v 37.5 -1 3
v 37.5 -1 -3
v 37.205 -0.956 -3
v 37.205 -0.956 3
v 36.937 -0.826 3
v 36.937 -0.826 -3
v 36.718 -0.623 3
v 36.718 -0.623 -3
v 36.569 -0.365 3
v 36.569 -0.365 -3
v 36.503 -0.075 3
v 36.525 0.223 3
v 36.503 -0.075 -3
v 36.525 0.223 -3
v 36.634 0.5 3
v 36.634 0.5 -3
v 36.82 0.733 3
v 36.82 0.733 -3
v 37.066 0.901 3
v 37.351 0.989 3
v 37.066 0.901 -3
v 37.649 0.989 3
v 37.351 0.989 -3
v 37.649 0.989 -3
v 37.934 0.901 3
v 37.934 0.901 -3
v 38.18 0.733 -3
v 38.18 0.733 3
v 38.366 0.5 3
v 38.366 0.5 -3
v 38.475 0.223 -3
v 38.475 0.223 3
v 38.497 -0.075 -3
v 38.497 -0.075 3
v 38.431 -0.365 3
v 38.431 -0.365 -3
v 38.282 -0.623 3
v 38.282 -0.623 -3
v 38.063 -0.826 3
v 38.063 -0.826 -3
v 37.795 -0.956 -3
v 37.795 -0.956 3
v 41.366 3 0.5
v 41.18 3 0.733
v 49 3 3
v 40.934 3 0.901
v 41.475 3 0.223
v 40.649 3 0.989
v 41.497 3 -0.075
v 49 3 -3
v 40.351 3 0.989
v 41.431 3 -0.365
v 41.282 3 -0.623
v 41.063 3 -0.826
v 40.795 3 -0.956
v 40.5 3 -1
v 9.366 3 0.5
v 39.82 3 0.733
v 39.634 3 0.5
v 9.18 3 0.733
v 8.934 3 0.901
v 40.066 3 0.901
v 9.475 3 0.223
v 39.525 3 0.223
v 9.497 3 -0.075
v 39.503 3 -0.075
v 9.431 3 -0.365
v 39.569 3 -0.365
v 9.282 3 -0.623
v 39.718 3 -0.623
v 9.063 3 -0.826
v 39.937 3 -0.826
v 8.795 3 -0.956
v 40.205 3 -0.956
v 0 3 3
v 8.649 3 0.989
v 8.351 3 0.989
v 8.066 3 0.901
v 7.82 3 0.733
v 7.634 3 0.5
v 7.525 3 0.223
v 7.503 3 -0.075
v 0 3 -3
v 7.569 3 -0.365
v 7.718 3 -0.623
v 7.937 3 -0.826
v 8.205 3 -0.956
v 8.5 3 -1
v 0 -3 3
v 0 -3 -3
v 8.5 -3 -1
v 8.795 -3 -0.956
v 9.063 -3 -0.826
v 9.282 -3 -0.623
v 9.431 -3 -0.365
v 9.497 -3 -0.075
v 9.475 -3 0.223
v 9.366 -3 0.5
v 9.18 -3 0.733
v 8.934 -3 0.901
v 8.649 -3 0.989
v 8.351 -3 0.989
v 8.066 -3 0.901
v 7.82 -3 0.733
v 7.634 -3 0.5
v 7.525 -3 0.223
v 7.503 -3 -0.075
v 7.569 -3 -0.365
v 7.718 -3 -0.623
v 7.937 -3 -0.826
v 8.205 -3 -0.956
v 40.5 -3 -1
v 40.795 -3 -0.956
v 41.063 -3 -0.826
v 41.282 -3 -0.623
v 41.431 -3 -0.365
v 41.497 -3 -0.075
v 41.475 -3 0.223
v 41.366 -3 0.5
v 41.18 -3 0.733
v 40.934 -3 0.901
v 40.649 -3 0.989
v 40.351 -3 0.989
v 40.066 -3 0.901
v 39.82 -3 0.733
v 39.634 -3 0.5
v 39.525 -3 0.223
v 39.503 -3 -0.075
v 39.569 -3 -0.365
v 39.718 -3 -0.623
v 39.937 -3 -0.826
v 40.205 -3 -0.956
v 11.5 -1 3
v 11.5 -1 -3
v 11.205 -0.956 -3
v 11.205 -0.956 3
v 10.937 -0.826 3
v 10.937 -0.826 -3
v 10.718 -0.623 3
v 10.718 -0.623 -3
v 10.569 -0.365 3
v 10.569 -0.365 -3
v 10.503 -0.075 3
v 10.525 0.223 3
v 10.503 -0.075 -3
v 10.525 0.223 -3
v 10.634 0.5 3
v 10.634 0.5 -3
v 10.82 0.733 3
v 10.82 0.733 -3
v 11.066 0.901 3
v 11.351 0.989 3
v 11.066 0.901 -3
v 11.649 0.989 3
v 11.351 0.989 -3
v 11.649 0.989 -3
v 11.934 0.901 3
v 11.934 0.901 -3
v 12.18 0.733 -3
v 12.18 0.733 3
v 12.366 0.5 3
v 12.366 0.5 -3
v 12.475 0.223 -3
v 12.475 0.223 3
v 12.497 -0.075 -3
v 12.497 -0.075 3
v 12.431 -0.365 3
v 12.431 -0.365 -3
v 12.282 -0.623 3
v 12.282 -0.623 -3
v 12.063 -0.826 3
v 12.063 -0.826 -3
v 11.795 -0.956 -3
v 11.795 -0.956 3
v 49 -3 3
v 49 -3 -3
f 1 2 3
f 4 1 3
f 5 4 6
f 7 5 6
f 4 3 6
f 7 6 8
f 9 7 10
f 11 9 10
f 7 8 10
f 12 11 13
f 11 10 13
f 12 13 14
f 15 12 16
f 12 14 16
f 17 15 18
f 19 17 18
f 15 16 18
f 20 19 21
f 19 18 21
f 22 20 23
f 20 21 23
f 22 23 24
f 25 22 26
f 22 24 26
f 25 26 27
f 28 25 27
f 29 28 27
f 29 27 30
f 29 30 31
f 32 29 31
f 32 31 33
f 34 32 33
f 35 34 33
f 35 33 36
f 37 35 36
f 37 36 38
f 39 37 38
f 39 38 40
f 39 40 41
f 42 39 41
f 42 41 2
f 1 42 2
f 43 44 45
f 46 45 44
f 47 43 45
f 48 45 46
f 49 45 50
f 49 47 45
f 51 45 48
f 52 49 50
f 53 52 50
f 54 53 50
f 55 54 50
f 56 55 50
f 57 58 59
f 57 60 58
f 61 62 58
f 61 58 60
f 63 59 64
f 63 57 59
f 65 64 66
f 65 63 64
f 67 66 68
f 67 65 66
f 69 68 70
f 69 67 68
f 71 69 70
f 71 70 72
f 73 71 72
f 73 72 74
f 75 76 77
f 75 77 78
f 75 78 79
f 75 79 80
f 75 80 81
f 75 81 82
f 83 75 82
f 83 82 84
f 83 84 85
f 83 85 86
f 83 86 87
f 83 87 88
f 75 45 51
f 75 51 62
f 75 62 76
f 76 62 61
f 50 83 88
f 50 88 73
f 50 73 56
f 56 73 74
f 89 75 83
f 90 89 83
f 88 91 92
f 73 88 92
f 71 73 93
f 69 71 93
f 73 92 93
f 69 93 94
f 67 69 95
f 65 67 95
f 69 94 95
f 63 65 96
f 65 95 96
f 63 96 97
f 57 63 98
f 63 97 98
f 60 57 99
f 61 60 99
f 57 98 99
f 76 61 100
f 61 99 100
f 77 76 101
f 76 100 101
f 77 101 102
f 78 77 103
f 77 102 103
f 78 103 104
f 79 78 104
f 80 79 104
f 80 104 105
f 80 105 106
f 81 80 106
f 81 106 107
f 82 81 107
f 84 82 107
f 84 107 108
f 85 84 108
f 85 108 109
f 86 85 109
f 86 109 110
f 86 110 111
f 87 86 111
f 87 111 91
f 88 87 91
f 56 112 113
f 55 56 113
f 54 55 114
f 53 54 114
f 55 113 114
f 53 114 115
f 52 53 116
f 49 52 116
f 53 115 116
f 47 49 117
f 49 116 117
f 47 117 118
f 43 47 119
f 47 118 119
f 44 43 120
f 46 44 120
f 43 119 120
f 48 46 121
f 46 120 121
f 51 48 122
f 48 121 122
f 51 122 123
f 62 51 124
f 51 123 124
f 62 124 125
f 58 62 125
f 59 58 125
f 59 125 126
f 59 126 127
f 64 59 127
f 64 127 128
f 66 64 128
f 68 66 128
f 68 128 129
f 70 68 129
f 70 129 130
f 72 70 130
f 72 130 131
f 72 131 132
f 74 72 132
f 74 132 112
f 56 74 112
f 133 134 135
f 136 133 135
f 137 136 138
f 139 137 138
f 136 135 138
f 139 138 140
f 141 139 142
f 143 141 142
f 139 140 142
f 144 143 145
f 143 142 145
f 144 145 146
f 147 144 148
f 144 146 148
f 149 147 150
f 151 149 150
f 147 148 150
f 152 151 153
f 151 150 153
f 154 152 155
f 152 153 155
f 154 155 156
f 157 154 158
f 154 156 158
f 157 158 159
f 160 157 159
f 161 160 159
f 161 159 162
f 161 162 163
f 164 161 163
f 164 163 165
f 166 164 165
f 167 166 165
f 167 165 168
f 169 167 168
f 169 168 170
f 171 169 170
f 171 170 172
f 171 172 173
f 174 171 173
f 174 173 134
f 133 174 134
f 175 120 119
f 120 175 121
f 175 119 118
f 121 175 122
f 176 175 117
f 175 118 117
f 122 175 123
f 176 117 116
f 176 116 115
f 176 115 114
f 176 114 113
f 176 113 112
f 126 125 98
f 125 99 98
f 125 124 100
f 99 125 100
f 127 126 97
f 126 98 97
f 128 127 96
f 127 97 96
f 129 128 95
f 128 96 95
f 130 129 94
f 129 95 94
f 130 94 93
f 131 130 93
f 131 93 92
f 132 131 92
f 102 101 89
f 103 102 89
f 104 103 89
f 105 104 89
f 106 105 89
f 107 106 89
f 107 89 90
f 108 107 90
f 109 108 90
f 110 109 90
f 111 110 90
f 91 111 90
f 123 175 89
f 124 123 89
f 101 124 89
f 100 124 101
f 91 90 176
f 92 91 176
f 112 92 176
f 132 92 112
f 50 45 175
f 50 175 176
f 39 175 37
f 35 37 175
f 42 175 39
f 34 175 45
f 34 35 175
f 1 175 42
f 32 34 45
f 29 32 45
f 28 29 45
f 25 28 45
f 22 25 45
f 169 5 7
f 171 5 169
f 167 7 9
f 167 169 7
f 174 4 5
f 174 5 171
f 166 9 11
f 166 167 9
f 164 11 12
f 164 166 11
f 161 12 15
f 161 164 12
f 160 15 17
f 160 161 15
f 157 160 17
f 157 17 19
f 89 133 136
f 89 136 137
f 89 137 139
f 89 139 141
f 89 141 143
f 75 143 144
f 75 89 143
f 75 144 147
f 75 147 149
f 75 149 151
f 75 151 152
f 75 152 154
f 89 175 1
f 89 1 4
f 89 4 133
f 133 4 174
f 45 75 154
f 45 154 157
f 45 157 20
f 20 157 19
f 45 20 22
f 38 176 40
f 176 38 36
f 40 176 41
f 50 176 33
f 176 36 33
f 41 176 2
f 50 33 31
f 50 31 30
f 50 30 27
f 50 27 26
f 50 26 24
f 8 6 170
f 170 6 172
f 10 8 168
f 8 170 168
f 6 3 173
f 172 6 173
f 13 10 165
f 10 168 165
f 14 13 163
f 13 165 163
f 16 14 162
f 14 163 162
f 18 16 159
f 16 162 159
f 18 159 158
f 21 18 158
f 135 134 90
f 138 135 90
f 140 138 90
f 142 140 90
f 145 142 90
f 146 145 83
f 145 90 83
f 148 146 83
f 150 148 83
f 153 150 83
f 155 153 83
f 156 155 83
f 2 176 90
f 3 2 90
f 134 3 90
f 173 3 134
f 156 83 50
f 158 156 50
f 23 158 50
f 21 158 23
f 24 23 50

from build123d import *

# Parameters (mm, degrees)
SKETCH1_W                 = 6
SKETCH1_H                 = 6
BOSS_EXTRUDE1_DEPTH       = 49
F_2_0MM_DOWEL_HOLE1_D     = 2
F_2_0MM_DOWEL_HOLE1_DEPTH = 10
F_2_0MM_DOWEL_HOLE1_TIP   = 0.600860619
F_2_0MM_DOWEL_HOLE8_D     = 2
F_2_0MM_DOWEL_HOLE8_DEPTH = 10
F_2_0MM_DOWEL_HOLE8_TIP   = 0.600860619


with BuildPart() as part:
    # Sketch1 → Boss-Extrude1 (new body)
    with BuildSketch(Plane(origin=(0, 0, 0), x_dir=(0, 0, -1), z_dir=(1, 0, 0))):
        Rectangle(SKETCH1_W, SKETCH1_H)
    extrude(amount=BOSS_EXTRUDE1_DEPTH)

    # Ø2.0mm Dowel Hole1
    with Locations(Plane(origin=(11.5, 0, 3), x_dir=(0, 1, 0), z_dir=(0, 0, 1))):
        with Locations((0, 0), (0, -26)):
            Hole(F_2_0MM_DOWEL_HOLE1_D / 2, depth=F_2_0MM_DOWEL_HOLE1_DEPTH)
            with Locations((0, 0, -(F_2_0MM_DOWEL_HOLE1_DEPTH + F_2_0MM_DOWEL_HOLE1_TIP / 2))):  # 118° drill point
                Cone(0, F_2_0MM_DOWEL_HOLE1_D / 2, F_2_0MM_DOWEL_HOLE1_TIP, mode=Mode.SUBTRACT)

    # Ø2.0mm Dowel Hole8
    with Locations(Plane(origin=(8.5, 3, 0), x_dir=(0, 0, 1), z_dir=(0, 1, 0))):
        with Locations((0, 0), (0, 32)):
            Hole(F_2_0MM_DOWEL_HOLE8_D / 2, depth=F_2_0MM_DOWEL_HOLE8_DEPTH)
            with Locations((0, 0, -(F_2_0MM_DOWEL_HOLE8_DEPTH + F_2_0MM_DOWEL_HOLE8_TIP / 2))):  # 118° drill point
                Cone(0, F_2_0MM_DOWEL_HOLE8_D / 2, F_2_0MM_DOWEL_HOLE8_TIP, mode=Mode.SUBTRACT)


solid = part.part
